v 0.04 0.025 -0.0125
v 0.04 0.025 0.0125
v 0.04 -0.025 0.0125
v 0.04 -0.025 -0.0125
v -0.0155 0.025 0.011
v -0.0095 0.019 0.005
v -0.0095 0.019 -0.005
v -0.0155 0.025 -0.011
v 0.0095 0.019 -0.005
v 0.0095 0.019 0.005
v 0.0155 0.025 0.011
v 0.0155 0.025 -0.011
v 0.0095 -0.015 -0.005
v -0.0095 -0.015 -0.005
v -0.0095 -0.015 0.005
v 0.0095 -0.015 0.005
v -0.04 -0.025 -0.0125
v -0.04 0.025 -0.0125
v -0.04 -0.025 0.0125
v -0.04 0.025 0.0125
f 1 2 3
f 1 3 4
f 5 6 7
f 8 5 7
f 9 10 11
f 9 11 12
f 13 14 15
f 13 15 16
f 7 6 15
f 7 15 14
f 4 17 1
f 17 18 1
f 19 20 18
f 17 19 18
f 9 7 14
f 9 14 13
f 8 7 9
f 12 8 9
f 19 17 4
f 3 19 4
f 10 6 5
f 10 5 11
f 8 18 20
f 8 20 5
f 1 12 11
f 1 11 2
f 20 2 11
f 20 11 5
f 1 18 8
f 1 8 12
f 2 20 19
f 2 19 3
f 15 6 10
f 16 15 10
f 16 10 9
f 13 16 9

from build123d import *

# Parameters (mm, degrees)
SKETCH1_W           = 0.08
SKETCH1_H           = 0.025
BOSS_EXTRUDE1_DEPTH = 0.025
SKETCH2_W           = 0.019
SKETCH2_H           = 0.01
CUT_EXTRUDE1_DEPTH  = 0.04
CHAMFER1_SIZE       = 0.006


with BuildPart() as part:
    # Sketch1 → Boss-Extrude1 (new, symmetric)
    with BuildSketch(Plane(origin=(0, 0, 0), x_dir=(1, 0, 0), z_dir=(0, 1, 0))):
        Rectangle(SKETCH1_W, SKETCH1_H)
    extrude(amount=BOSS_EXTRUDE1_DEPTH, both=True)

    # Sketch2 → Cut-Extrude1 (cut)
    with BuildSketch(Plane(origin=(0, 0.025, 0), x_dir=(1, 0, 0), z_dir=(0, 1, 0))):
        Rectangle(SKETCH2_W, SKETCH2_H)
    extrude(amount=-CUT_EXTRUDE1_DEPTH, mode=Mode.SUBTRACT)

    # Chamfer1
    chamfer1_edges = [part.edges().sort_by_distance(p)[0] for p in [
        (0.0095, 0.025, 0),
        (0, 0.025, -0.005),
        (-0.0095, 0.025, 0),
        (0, 0.025, 0.005),
    ]]
    chamfer(chamfer1_edges, length=CHAMFER1_SIZE)


solid = part.part
